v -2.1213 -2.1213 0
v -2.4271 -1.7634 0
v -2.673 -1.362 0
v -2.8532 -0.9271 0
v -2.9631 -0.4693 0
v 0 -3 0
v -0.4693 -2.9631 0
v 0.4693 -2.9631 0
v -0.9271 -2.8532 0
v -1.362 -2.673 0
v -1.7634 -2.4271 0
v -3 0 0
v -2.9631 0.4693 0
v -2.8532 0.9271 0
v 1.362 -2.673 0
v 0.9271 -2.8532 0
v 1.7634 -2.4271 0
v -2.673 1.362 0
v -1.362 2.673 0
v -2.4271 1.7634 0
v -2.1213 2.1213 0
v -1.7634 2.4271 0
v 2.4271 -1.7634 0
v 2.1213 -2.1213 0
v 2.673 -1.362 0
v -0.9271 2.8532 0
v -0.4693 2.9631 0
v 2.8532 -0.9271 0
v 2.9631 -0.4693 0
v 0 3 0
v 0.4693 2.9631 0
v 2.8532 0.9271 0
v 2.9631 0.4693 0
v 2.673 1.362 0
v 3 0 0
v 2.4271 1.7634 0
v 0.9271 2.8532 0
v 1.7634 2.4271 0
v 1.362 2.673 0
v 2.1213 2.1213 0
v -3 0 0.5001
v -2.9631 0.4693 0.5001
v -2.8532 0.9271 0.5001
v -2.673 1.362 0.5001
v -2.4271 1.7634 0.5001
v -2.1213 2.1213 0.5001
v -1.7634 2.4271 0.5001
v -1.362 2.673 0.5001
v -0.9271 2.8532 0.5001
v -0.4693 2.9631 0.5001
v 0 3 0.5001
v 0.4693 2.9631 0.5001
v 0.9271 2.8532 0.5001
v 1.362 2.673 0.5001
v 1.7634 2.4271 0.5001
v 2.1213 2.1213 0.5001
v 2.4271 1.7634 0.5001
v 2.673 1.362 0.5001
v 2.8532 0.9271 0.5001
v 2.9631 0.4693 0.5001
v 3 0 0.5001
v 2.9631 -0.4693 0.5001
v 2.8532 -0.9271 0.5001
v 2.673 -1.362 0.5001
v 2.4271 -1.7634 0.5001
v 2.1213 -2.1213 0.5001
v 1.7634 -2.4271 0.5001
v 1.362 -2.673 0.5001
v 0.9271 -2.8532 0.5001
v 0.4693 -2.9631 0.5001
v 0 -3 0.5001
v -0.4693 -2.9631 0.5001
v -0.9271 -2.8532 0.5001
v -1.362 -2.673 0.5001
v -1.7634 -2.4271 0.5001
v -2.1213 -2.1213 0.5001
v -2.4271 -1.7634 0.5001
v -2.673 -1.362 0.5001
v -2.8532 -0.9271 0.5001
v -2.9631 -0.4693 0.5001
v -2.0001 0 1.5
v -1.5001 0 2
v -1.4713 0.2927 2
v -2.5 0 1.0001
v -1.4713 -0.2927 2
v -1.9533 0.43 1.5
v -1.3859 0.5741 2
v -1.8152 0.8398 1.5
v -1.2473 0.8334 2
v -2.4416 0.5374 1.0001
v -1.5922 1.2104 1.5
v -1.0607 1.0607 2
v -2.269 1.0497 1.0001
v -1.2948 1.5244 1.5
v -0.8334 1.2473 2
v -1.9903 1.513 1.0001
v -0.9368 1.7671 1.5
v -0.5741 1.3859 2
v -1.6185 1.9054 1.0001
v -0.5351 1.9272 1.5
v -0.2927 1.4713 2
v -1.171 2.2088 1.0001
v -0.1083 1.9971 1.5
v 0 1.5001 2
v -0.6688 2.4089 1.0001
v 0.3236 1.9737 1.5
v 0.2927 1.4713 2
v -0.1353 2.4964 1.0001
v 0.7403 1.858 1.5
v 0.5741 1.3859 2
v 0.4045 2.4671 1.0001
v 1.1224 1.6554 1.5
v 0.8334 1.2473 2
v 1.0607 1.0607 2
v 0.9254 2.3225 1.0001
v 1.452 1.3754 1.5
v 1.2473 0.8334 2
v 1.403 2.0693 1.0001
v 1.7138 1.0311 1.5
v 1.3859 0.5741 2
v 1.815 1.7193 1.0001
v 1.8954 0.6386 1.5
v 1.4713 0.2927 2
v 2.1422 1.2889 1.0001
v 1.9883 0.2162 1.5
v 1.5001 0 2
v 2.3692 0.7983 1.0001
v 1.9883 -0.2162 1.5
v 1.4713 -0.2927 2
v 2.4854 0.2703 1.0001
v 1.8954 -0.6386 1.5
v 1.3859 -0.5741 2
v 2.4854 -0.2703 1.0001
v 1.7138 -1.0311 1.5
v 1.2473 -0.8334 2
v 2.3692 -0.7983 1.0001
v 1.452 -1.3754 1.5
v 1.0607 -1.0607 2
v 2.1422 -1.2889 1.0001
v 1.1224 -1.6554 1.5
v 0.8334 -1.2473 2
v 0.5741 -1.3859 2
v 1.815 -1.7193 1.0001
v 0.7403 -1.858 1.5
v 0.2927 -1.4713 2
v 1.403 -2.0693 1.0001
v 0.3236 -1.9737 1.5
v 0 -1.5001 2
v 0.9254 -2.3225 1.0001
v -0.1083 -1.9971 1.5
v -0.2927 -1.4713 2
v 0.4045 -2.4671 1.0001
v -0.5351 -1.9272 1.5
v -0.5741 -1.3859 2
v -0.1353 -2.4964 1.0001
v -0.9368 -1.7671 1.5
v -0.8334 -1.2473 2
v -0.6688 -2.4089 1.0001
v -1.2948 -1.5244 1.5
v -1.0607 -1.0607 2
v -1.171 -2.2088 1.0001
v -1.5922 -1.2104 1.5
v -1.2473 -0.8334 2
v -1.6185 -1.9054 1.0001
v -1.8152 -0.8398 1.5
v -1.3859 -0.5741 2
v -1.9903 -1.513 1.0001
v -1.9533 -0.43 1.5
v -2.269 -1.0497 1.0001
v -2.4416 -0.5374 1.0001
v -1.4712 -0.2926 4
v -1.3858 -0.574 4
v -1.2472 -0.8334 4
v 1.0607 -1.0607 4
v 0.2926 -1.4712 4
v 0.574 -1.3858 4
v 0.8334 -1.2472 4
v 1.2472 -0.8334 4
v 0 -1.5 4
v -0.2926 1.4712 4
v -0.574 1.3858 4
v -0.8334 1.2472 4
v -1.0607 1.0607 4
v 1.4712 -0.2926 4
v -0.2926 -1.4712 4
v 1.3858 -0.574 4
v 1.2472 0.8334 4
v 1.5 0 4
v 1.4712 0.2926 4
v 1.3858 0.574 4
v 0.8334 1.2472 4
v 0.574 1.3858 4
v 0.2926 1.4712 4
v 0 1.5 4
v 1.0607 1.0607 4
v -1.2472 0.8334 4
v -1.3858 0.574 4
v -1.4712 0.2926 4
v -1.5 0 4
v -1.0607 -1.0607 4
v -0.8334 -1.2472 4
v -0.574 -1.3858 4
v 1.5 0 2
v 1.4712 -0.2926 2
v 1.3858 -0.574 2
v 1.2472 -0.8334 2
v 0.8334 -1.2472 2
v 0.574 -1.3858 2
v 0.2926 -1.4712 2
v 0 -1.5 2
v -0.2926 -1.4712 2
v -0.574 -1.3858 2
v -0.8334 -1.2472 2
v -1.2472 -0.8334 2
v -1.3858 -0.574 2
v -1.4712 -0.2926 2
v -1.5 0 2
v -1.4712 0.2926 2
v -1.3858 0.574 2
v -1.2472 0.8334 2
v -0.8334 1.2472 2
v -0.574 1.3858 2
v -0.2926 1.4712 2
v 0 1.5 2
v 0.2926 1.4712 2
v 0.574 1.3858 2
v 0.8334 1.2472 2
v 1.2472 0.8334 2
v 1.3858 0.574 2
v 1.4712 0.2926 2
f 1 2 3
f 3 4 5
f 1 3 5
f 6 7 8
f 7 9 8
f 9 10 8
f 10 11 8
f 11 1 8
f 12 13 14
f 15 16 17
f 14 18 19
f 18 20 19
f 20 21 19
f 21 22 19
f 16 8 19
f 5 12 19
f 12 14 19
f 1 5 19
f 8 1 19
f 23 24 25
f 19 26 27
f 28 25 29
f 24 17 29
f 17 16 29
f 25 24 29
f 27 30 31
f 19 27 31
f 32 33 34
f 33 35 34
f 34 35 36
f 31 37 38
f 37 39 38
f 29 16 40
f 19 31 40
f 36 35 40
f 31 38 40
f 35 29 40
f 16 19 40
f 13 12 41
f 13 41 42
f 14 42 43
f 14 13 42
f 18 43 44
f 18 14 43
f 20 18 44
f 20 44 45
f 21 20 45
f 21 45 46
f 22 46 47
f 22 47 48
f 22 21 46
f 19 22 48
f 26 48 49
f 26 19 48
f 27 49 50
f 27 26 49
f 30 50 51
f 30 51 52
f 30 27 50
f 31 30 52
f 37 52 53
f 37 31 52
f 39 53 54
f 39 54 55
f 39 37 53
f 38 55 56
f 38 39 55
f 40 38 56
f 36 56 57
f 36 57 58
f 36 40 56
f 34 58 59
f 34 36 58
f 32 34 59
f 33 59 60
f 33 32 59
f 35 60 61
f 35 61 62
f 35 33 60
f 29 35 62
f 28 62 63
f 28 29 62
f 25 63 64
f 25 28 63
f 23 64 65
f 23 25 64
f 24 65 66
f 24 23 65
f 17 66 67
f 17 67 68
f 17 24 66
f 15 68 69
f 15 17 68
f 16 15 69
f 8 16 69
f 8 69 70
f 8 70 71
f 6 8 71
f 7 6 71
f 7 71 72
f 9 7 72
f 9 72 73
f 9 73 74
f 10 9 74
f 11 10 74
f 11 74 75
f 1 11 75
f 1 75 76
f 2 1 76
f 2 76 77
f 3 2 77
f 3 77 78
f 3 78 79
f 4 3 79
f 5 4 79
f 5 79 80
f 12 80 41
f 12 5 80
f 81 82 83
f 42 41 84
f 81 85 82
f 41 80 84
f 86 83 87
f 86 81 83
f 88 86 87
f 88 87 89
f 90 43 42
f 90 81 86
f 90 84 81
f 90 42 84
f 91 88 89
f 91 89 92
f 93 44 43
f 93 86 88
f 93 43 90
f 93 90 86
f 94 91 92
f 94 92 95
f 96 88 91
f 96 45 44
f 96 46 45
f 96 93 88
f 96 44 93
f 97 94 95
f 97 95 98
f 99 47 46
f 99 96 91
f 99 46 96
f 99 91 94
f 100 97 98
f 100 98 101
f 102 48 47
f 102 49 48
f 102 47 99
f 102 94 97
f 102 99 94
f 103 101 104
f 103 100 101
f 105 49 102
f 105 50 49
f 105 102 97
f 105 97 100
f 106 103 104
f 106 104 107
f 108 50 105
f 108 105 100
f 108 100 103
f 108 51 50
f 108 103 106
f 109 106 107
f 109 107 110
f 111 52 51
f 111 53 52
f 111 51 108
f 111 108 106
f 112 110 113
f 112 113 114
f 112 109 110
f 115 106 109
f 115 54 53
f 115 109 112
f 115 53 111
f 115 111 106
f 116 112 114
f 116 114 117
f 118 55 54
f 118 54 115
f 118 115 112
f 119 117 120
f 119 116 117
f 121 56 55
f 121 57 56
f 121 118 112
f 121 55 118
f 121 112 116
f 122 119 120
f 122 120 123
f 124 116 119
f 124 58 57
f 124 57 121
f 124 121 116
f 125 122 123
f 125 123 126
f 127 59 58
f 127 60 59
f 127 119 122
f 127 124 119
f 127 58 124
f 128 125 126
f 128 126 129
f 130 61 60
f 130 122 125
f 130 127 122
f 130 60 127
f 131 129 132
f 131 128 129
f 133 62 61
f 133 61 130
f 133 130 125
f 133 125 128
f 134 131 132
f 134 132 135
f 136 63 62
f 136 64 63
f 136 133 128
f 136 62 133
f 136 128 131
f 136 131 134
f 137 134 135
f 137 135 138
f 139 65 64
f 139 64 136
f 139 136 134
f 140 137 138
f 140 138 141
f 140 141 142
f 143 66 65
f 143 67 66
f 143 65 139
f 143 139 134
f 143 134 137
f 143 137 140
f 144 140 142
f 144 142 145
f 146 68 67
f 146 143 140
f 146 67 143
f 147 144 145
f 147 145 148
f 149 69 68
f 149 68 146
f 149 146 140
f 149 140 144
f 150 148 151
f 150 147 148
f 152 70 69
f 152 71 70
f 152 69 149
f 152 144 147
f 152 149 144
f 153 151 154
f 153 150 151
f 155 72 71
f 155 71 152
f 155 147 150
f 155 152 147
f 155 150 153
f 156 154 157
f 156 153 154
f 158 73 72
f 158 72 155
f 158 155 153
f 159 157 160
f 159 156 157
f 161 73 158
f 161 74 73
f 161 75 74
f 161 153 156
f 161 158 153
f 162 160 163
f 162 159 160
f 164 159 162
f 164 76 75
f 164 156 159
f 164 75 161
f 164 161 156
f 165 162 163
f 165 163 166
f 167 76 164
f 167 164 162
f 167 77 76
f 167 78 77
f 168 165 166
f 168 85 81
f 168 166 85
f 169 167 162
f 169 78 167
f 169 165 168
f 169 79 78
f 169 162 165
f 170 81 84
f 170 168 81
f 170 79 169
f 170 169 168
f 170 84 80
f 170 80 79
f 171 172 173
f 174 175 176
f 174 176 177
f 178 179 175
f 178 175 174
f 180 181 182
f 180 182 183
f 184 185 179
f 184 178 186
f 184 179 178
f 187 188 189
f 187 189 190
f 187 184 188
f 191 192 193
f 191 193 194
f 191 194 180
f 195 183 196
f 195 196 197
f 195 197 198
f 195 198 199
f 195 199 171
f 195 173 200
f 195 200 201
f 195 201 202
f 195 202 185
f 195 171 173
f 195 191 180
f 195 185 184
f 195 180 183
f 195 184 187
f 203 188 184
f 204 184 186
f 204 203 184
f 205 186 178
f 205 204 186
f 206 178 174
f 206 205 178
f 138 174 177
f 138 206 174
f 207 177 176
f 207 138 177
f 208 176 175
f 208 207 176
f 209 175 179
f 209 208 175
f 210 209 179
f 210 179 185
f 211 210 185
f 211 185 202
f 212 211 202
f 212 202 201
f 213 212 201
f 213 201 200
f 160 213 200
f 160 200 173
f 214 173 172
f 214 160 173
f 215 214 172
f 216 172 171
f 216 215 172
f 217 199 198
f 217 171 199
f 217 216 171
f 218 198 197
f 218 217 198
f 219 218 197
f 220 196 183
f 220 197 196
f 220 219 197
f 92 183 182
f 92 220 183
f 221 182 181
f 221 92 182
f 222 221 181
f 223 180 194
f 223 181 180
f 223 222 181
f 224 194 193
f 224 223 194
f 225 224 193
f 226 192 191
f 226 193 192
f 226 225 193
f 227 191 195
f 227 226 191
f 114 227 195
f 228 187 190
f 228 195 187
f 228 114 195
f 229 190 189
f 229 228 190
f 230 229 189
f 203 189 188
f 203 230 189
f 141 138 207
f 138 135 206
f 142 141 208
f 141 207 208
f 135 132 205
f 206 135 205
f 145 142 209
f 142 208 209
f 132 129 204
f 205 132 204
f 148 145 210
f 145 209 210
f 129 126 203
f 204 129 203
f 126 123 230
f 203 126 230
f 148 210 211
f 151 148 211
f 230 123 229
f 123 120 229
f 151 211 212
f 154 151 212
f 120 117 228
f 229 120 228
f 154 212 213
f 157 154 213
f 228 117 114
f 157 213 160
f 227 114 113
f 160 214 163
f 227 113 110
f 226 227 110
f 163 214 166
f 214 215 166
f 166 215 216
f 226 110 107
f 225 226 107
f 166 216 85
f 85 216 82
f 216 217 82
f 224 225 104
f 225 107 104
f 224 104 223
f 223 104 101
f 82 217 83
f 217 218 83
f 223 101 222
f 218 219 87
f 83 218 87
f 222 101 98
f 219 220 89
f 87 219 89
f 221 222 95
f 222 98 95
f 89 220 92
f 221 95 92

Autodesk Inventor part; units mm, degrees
ref_plane "YZ Plane" through (0, 0, 0) normal (1, 0, 0) x (0, 1, 0)
ref_plane "XZ Plane" through (0, 0, 0) normal (0, 1, 0) x (-1, 0, 0)
ref_plane "XY Plane" through (0, 0, 0) normal (0, 0, 1) x (1, 0, 0)
sketch "スケッチ1" plane through (0, 0, 0) normal (0, 0, 1) x (1, 0, 0)
  circle A0 centre (0, 0) radius 1.5
  dimension "d0" = 3
extrude "押し出し1" add sketch "スケッチ1" along normal blind 4
sketch "スケッチ2" plane through (0, 0, 0) normal (0, 0, -1) x (-1, 0, 0)
  circle A0 centre (0, 0) radius 3
  dimension "d3" = 6
extrude "押し出し2" add sketch "スケッチ2" against normal blind 2
thread "ねじ1" size "M3x0.5" class "6g" standard "ANSI Metric M Profile" full length
chamfer "面取り1" distance 1.5 angle 45 1 edges at (3, 0, 2)
properties part number "ネジ皿m3,04" material "鋼、高強度、低合金"
